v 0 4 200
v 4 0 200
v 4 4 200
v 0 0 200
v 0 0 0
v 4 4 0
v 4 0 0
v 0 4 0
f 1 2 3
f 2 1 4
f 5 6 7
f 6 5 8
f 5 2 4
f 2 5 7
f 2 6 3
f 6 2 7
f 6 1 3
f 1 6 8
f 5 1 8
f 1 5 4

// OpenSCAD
// 单位默认是毫米 (mm)

$fa = 1;            // 细分角度
$fs = 0.5;          // 最小边长

cube([4, 4, 200], center = false);  // 底面位于 Z=0，顶面在 Z=200
